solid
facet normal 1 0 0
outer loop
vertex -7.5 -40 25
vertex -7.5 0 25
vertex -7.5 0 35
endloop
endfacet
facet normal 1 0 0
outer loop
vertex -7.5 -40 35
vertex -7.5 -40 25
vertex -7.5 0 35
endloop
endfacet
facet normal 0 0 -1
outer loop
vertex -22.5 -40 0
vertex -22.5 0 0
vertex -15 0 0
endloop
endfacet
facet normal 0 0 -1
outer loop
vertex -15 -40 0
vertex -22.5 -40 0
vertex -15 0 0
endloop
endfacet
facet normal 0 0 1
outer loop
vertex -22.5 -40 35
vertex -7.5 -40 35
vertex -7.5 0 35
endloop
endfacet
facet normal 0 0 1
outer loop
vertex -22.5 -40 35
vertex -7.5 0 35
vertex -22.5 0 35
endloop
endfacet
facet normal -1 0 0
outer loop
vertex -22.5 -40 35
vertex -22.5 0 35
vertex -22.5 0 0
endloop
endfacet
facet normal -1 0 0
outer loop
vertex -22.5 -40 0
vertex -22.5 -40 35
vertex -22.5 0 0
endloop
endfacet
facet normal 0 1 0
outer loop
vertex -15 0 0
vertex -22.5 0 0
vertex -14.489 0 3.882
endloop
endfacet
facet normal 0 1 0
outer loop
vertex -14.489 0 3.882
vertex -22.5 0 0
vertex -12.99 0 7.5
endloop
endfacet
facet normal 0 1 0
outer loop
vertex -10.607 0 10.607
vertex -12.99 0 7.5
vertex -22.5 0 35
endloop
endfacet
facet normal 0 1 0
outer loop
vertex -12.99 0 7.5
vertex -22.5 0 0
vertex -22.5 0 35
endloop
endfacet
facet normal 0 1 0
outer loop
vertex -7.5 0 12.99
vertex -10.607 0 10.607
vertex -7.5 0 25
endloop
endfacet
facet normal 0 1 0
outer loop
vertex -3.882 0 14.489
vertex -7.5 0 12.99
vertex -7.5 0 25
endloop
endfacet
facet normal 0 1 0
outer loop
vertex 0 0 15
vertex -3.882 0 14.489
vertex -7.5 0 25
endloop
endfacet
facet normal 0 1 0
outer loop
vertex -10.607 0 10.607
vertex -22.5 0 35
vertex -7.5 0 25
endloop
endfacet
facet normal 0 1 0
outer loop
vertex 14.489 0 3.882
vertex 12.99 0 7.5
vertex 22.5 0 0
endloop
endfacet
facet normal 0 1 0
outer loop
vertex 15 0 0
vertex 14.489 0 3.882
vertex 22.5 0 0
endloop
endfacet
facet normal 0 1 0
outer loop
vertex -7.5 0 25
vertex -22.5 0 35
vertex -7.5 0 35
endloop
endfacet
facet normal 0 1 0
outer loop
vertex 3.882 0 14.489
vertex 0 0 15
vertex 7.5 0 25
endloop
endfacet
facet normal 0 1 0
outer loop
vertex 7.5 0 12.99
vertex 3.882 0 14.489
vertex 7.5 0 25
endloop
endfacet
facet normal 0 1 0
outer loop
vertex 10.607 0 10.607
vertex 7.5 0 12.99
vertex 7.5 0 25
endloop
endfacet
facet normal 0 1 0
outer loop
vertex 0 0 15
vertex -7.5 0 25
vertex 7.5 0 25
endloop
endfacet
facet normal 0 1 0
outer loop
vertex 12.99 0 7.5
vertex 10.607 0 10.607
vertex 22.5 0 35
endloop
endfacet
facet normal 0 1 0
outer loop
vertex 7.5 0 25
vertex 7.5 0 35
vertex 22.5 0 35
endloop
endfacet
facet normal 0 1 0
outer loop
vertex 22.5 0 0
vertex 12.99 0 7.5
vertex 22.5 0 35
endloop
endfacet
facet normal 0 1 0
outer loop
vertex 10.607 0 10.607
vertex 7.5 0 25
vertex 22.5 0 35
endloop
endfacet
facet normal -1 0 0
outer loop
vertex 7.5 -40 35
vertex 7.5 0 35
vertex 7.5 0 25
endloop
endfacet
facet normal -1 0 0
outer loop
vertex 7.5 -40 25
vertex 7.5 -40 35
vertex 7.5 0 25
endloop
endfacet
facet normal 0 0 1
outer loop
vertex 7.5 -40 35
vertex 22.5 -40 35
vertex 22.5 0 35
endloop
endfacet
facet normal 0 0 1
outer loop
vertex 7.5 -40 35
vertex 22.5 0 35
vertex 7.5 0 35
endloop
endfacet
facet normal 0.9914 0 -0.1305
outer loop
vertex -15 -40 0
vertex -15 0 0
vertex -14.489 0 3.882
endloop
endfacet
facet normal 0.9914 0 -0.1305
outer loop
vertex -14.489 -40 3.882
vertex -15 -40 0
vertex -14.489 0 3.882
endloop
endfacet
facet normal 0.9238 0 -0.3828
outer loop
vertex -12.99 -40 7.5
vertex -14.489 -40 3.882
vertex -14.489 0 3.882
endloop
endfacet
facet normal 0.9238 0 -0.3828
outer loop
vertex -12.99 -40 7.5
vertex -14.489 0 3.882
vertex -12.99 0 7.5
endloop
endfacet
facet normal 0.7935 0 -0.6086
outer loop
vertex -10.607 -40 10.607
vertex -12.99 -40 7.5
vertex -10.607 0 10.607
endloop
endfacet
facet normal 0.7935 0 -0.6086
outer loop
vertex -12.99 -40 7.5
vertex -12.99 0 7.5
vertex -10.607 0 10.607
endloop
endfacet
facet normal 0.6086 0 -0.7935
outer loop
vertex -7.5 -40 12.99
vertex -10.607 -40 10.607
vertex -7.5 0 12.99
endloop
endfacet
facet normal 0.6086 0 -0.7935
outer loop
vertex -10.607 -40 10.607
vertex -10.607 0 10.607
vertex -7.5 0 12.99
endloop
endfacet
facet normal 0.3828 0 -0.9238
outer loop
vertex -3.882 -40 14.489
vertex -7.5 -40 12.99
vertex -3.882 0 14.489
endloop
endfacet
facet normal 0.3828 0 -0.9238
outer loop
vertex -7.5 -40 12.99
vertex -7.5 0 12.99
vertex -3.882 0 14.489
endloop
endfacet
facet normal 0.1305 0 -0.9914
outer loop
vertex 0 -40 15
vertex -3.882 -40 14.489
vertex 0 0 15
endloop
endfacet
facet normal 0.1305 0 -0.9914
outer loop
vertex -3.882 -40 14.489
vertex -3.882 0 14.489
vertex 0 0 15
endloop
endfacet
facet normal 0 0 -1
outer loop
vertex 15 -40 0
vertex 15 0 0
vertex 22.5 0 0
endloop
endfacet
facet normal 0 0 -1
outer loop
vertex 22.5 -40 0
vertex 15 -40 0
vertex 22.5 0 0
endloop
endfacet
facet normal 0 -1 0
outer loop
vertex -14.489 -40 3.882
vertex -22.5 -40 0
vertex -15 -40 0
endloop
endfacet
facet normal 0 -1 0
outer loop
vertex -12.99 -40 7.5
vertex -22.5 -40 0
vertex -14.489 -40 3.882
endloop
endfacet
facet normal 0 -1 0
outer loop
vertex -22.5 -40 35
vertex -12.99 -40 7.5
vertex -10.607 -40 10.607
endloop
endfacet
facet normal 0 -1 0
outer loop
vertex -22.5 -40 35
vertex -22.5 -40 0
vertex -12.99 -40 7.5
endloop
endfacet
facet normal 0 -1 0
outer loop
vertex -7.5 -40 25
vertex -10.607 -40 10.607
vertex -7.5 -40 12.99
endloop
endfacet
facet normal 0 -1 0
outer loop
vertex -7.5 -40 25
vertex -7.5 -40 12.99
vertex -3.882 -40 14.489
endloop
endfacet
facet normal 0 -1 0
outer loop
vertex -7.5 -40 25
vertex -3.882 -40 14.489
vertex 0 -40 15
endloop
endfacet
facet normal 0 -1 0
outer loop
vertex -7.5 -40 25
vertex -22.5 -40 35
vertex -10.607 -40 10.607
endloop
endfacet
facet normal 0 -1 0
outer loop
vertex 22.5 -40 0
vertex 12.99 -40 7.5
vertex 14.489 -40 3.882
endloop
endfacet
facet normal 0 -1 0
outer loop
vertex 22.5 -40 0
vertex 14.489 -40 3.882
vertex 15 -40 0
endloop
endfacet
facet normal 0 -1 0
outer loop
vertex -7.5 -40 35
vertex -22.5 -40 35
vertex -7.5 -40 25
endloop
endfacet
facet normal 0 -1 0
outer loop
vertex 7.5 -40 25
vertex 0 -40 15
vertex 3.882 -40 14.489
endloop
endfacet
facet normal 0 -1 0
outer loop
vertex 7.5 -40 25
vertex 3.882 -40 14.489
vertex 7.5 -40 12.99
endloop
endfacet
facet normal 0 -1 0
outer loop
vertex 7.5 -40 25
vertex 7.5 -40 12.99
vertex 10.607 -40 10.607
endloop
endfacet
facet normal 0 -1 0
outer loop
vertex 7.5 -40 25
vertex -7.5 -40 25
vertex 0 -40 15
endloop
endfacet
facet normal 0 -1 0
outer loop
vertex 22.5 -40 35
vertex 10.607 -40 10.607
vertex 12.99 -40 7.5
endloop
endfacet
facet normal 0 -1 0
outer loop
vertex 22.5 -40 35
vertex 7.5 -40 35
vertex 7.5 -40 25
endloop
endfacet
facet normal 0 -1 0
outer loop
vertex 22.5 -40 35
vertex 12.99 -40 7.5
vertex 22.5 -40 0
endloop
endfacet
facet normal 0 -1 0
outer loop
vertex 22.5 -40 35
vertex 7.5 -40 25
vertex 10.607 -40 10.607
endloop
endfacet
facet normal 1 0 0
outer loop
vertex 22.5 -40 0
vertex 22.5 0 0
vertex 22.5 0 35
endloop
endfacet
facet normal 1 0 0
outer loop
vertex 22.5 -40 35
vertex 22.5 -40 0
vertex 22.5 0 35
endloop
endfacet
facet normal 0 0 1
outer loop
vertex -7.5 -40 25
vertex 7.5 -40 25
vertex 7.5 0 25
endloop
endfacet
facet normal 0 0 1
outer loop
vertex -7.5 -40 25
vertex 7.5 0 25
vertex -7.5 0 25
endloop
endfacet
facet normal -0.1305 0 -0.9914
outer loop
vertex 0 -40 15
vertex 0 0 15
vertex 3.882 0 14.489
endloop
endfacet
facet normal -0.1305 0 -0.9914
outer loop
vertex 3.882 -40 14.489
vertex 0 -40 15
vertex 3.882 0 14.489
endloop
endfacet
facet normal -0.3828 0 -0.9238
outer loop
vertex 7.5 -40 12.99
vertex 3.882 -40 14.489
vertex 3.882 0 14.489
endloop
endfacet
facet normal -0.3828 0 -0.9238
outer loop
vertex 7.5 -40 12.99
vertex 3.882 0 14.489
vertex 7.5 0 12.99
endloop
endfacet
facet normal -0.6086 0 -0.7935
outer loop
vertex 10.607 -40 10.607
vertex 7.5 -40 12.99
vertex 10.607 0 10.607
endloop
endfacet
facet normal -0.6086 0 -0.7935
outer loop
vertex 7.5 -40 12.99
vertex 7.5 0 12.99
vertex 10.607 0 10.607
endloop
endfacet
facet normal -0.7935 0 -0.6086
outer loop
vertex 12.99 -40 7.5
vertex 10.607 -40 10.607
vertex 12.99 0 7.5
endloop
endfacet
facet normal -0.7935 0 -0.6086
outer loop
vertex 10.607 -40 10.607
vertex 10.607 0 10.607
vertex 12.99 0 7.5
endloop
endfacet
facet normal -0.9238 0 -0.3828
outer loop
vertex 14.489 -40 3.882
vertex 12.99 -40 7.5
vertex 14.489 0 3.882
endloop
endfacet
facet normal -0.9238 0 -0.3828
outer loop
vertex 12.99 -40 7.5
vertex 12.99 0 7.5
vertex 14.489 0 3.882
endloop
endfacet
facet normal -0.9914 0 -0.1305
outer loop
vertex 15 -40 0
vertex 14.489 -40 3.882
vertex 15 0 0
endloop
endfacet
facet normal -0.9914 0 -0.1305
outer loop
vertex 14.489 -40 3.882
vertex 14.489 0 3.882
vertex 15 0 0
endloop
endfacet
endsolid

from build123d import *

# Parameters (mm, degrees)
F1_DEPTH = 40


with BuildPart() as f1:
    # F0 (on Front) → F1 (new body)
    with BuildSketch(Plane.XZ):
        with BuildLine():
            Line((-22.5, 0), (-15, 0))
            ThreePointArc((-15, 0), (-10.606602, 10.606602), (0, 15))
            ThreePointArc((0, 15), (10.606602, 10.606602), (15, 0))
            Line((15, 0), (22.5, 0))
            Line((22.5, 0), (22.5, 35))
            Line((22.5, 35), (7.5, 35))
            Line((7.5, 35), (7.5, 25))
            Line((7.5, 25), (-7.5, 25))
            Line((-7.5, 25), (-7.5, 35))
            Line((-7.5, 35), (-22.5, 35))
            Line((-22.5, 35), (-22.5, 0))
        make_face()
    extrude(amount=F1_DEPTH)


solid = f1.part
